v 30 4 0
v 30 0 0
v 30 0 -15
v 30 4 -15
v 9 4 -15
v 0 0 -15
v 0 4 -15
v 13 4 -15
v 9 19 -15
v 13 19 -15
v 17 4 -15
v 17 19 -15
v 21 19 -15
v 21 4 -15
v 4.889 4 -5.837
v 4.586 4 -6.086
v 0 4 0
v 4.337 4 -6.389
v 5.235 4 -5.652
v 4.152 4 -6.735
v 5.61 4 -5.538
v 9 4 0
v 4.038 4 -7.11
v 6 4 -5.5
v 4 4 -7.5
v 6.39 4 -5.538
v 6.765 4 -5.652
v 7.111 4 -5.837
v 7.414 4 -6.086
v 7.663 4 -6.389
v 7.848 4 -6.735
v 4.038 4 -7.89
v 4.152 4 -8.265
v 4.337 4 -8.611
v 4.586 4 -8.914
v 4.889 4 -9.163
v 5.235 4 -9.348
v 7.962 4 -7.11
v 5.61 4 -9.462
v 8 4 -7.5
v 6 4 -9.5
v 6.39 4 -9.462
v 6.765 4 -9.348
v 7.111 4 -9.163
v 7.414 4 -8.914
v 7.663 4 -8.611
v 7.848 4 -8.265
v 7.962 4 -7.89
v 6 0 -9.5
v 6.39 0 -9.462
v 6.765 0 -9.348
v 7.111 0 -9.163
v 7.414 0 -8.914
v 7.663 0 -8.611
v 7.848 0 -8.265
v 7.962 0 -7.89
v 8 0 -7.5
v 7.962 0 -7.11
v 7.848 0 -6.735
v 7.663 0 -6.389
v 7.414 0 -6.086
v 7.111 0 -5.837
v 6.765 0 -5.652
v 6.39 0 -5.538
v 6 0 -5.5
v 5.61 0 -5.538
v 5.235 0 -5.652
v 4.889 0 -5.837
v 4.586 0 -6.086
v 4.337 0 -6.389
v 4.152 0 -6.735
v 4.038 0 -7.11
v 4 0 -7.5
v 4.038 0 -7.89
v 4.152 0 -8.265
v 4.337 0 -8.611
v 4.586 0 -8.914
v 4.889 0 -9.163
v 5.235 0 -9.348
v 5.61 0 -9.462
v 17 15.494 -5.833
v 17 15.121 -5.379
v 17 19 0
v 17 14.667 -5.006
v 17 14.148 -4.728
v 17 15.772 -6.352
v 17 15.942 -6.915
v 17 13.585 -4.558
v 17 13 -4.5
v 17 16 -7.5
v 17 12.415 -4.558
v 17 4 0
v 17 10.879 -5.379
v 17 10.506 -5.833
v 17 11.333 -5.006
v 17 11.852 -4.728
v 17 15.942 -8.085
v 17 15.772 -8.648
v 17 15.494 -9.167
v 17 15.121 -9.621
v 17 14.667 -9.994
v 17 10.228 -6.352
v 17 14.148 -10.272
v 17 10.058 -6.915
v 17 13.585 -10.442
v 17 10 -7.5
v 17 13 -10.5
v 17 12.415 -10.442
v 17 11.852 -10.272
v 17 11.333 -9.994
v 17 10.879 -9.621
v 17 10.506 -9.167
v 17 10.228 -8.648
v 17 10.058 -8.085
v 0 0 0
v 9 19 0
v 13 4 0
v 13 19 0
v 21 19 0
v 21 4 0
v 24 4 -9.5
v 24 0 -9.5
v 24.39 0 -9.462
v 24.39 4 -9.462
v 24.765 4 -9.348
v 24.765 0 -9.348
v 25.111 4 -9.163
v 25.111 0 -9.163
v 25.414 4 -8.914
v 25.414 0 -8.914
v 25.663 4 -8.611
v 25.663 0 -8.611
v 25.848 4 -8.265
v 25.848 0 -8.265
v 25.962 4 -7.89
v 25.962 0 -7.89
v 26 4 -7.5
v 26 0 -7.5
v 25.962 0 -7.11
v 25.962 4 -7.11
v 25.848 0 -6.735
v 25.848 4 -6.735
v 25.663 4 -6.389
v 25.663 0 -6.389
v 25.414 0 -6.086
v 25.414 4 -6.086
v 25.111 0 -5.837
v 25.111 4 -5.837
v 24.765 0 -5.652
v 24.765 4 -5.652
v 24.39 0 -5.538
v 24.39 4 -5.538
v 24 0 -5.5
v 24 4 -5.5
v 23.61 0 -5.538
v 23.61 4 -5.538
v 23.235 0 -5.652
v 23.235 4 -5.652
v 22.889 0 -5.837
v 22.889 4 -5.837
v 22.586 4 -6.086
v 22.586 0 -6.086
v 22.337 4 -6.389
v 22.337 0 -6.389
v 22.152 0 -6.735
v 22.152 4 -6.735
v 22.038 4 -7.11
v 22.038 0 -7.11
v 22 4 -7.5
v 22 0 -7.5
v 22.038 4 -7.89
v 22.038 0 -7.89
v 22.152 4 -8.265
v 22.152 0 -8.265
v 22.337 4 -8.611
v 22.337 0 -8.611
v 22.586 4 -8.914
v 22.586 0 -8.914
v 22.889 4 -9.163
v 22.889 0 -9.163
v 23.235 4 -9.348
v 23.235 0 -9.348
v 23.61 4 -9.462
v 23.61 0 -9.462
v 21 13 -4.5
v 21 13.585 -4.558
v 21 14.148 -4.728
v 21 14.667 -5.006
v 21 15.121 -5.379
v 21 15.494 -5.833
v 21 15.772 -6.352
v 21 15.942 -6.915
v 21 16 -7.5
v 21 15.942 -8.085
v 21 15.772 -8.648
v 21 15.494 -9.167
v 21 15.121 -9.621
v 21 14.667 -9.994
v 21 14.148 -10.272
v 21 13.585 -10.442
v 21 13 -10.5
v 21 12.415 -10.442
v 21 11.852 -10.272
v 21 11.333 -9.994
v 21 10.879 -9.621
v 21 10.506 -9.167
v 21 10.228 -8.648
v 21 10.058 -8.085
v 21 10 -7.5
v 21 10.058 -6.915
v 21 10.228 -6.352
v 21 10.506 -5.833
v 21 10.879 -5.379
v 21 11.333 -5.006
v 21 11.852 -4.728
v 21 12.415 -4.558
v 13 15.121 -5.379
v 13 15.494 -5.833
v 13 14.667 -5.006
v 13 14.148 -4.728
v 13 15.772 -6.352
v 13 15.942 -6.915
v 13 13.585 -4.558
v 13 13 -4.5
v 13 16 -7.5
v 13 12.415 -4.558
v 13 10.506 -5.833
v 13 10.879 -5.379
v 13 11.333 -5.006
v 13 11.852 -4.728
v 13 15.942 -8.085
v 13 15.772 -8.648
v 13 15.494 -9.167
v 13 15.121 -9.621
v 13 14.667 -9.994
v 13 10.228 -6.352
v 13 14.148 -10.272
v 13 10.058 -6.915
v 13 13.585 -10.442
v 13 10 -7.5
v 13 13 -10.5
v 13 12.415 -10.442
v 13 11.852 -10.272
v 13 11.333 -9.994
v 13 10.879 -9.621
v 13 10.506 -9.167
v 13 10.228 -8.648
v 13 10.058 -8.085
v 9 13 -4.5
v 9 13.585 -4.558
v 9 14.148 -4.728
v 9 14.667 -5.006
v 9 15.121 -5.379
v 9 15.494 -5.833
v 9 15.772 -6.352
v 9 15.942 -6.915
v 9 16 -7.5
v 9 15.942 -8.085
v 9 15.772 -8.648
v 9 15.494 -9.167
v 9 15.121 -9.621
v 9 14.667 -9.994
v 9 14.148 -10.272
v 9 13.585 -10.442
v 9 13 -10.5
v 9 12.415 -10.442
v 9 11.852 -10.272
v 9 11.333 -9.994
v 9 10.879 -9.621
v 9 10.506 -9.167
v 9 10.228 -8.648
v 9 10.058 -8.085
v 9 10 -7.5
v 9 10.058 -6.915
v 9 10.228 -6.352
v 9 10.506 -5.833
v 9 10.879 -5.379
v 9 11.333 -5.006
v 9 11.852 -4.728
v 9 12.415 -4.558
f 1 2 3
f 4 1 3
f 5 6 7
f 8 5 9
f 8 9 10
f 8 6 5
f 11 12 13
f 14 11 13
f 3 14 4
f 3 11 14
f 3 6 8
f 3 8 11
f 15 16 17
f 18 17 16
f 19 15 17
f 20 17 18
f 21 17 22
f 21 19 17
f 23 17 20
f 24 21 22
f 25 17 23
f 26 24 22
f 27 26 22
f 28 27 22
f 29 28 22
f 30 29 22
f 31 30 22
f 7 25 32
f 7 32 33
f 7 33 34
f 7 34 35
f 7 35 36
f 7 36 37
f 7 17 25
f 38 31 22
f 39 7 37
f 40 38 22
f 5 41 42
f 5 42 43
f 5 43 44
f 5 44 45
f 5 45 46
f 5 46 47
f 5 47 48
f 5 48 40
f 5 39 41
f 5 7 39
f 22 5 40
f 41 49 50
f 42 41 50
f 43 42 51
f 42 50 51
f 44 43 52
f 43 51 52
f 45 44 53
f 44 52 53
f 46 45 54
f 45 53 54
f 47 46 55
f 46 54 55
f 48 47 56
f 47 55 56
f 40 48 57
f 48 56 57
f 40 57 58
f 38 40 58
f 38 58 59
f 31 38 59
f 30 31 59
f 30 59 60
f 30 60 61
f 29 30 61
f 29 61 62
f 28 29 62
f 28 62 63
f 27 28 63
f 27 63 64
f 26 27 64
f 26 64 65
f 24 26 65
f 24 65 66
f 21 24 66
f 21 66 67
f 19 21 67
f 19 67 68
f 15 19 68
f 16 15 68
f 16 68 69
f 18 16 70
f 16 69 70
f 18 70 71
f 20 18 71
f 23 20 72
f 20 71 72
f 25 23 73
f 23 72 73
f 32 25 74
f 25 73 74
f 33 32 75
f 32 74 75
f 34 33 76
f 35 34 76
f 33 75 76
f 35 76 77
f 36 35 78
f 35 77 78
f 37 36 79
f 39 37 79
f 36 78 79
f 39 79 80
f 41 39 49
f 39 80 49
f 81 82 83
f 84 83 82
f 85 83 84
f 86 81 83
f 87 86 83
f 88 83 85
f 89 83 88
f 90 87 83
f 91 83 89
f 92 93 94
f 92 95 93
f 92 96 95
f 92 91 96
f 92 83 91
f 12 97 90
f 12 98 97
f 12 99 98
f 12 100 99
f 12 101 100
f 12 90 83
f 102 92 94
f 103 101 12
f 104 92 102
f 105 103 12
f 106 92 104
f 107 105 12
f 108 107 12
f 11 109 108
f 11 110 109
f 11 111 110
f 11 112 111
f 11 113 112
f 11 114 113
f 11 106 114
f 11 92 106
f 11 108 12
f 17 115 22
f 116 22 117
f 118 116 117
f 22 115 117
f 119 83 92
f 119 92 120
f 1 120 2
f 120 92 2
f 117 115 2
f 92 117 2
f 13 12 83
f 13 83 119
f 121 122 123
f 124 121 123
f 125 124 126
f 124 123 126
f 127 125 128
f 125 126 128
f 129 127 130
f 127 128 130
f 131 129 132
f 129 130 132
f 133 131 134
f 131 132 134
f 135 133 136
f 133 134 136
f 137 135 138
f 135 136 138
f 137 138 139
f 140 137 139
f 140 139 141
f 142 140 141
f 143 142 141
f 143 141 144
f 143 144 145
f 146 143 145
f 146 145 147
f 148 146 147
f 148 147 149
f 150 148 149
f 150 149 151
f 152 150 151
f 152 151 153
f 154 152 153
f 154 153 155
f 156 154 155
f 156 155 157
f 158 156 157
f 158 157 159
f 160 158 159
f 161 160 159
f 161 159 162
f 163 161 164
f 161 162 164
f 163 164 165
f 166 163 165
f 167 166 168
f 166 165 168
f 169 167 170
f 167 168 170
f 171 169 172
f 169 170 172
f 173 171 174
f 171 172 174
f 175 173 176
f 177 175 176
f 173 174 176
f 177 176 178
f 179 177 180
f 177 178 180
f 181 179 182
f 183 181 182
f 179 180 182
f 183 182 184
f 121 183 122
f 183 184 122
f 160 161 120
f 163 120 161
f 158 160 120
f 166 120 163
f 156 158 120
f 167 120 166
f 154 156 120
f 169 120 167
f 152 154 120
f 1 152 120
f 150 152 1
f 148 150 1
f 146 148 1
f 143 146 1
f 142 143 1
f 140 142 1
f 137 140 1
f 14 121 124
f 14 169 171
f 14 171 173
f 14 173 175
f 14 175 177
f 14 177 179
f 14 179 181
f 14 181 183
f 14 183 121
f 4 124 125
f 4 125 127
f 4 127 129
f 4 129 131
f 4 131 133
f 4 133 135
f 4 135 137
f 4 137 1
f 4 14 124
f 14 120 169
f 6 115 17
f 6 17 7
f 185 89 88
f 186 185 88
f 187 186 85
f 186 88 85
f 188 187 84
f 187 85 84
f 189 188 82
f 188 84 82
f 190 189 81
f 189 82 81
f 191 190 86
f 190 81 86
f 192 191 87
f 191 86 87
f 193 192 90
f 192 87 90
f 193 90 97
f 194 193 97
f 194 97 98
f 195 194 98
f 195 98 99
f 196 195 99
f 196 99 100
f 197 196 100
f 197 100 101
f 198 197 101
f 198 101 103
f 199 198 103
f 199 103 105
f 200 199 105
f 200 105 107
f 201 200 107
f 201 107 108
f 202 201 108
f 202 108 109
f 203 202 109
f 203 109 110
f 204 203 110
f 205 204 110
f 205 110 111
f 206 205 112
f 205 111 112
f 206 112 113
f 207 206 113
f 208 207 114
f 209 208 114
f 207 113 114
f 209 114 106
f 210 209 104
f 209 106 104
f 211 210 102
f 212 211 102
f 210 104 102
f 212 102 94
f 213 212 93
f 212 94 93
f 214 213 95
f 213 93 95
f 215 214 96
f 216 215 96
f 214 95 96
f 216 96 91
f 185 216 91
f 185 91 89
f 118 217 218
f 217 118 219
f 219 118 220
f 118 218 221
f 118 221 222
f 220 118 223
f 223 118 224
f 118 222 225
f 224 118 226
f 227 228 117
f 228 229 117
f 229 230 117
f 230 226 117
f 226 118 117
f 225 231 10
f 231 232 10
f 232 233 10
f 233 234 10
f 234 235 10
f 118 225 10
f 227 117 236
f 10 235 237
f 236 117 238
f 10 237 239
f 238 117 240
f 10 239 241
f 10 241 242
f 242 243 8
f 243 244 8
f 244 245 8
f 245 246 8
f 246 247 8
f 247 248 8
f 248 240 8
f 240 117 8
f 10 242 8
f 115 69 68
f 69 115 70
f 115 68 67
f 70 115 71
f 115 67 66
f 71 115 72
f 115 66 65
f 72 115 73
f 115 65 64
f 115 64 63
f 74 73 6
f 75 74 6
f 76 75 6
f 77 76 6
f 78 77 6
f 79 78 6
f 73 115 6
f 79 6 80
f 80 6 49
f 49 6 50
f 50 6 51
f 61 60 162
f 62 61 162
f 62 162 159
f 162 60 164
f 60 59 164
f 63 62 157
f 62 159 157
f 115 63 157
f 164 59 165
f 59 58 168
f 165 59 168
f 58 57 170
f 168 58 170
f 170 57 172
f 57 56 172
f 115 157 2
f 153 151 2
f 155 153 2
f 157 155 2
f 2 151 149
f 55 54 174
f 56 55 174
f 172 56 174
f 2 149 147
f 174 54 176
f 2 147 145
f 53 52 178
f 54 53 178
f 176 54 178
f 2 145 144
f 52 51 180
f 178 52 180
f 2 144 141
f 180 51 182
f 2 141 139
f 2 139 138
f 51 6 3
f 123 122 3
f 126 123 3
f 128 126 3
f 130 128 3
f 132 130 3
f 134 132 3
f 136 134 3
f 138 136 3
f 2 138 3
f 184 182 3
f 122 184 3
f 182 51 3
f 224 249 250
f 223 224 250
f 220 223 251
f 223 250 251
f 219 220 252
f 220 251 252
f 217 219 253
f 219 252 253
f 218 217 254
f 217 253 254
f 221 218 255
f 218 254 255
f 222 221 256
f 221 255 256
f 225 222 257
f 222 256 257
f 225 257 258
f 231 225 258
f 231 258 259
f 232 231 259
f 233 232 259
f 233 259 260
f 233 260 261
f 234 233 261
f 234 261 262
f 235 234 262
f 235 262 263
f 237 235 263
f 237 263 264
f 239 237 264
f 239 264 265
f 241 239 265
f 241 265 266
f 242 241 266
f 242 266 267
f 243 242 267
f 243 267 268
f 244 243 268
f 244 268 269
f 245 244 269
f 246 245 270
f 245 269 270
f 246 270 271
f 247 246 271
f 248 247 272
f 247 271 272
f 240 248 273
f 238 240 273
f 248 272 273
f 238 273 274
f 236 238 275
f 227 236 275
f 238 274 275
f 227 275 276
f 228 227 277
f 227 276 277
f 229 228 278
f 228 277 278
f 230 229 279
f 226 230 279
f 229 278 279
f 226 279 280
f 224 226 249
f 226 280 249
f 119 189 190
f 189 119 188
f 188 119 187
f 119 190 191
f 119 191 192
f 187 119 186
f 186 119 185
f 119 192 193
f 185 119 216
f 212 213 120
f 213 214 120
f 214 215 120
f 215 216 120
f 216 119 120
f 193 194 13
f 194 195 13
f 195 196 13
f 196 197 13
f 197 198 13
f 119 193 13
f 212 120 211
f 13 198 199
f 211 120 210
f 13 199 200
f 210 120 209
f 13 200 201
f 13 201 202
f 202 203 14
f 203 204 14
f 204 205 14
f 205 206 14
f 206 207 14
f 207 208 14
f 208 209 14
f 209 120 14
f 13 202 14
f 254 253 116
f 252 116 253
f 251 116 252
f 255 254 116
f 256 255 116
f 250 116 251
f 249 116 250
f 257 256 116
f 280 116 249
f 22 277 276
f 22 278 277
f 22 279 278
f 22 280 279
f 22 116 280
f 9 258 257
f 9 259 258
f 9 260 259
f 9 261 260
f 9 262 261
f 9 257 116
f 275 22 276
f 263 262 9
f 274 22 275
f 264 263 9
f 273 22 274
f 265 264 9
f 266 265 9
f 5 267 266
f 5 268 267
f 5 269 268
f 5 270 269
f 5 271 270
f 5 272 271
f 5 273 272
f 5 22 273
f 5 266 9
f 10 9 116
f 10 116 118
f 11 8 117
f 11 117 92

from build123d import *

# Parameters (mm, degrees)
SKETCH_1_W          = 30
SKETCH_1_H          = 15
EXTRUDE_1_DEPTH     = 4
SKETCH_2_W          = 4
SKETCH_2_H          = 15
EXTRUDE_2_DEPTH     = 15
SKETCH_3_R          = 2
CUT_EXTRUDE_1_DEPTH = 15
SKETCH_4_R          = 3
CUT_EXTRUDE_2_DEPTH = 15


with BuildPart() as part:
    # Эскиз1 → Бобышка-Вытянуть1 (new body)
    with BuildSketch(Plane(origin=(0, 0, 0), x_dir=(1, 0, 0), z_dir=(0, 1, 0))):
        with Locations((15, 7.5)):
            Rectangle(SKETCH_1_W, SKETCH_1_H)
    extrude(amount=EXTRUDE_1_DEPTH)

    # Эскиз2 → Бобышка-Вытянуть2 (add)
    with BuildSketch(Plane(origin=(0, 4, 0), x_dir=(1, 0, 0), z_dir=(0, 1, 0))):
        with Locations((11, 7.5)):
            Rectangle(SKETCH_2_W, SKETCH_2_H)
        with Locations((19, 7.5)):
            Rectangle(SKETCH_2_W, SKETCH_2_H)
    extrude(amount=EXTRUDE_2_DEPTH)

    # Эскиз3 → Вырез-Вытянуть1 (cut)
    with BuildSketch(Plane.XZ):
        with Locations(Location((6, -7.5, 0), (0, 0, 270))):
            Circle(SKETCH_3_R)
        with Locations(Location((24, -7.5, 0), (0, 0, 270))):
            Circle(SKETCH_3_R)
    extrude(amount=-CUT_EXTRUDE_1_DEPTH, mode=Mode.SUBTRACT)

    # Эскиз4 → Вырез-Вытянуть2 (cut)
    with BuildSketch(Plane.ZY.offset(-9)):
        with Locations((-7.5, 13)):
            Circle(SKETCH_4_R)
    extrude(amount=-CUT_EXTRUDE_2_DEPTH, mode=Mode.SUBTRACT)


solid = part.part
